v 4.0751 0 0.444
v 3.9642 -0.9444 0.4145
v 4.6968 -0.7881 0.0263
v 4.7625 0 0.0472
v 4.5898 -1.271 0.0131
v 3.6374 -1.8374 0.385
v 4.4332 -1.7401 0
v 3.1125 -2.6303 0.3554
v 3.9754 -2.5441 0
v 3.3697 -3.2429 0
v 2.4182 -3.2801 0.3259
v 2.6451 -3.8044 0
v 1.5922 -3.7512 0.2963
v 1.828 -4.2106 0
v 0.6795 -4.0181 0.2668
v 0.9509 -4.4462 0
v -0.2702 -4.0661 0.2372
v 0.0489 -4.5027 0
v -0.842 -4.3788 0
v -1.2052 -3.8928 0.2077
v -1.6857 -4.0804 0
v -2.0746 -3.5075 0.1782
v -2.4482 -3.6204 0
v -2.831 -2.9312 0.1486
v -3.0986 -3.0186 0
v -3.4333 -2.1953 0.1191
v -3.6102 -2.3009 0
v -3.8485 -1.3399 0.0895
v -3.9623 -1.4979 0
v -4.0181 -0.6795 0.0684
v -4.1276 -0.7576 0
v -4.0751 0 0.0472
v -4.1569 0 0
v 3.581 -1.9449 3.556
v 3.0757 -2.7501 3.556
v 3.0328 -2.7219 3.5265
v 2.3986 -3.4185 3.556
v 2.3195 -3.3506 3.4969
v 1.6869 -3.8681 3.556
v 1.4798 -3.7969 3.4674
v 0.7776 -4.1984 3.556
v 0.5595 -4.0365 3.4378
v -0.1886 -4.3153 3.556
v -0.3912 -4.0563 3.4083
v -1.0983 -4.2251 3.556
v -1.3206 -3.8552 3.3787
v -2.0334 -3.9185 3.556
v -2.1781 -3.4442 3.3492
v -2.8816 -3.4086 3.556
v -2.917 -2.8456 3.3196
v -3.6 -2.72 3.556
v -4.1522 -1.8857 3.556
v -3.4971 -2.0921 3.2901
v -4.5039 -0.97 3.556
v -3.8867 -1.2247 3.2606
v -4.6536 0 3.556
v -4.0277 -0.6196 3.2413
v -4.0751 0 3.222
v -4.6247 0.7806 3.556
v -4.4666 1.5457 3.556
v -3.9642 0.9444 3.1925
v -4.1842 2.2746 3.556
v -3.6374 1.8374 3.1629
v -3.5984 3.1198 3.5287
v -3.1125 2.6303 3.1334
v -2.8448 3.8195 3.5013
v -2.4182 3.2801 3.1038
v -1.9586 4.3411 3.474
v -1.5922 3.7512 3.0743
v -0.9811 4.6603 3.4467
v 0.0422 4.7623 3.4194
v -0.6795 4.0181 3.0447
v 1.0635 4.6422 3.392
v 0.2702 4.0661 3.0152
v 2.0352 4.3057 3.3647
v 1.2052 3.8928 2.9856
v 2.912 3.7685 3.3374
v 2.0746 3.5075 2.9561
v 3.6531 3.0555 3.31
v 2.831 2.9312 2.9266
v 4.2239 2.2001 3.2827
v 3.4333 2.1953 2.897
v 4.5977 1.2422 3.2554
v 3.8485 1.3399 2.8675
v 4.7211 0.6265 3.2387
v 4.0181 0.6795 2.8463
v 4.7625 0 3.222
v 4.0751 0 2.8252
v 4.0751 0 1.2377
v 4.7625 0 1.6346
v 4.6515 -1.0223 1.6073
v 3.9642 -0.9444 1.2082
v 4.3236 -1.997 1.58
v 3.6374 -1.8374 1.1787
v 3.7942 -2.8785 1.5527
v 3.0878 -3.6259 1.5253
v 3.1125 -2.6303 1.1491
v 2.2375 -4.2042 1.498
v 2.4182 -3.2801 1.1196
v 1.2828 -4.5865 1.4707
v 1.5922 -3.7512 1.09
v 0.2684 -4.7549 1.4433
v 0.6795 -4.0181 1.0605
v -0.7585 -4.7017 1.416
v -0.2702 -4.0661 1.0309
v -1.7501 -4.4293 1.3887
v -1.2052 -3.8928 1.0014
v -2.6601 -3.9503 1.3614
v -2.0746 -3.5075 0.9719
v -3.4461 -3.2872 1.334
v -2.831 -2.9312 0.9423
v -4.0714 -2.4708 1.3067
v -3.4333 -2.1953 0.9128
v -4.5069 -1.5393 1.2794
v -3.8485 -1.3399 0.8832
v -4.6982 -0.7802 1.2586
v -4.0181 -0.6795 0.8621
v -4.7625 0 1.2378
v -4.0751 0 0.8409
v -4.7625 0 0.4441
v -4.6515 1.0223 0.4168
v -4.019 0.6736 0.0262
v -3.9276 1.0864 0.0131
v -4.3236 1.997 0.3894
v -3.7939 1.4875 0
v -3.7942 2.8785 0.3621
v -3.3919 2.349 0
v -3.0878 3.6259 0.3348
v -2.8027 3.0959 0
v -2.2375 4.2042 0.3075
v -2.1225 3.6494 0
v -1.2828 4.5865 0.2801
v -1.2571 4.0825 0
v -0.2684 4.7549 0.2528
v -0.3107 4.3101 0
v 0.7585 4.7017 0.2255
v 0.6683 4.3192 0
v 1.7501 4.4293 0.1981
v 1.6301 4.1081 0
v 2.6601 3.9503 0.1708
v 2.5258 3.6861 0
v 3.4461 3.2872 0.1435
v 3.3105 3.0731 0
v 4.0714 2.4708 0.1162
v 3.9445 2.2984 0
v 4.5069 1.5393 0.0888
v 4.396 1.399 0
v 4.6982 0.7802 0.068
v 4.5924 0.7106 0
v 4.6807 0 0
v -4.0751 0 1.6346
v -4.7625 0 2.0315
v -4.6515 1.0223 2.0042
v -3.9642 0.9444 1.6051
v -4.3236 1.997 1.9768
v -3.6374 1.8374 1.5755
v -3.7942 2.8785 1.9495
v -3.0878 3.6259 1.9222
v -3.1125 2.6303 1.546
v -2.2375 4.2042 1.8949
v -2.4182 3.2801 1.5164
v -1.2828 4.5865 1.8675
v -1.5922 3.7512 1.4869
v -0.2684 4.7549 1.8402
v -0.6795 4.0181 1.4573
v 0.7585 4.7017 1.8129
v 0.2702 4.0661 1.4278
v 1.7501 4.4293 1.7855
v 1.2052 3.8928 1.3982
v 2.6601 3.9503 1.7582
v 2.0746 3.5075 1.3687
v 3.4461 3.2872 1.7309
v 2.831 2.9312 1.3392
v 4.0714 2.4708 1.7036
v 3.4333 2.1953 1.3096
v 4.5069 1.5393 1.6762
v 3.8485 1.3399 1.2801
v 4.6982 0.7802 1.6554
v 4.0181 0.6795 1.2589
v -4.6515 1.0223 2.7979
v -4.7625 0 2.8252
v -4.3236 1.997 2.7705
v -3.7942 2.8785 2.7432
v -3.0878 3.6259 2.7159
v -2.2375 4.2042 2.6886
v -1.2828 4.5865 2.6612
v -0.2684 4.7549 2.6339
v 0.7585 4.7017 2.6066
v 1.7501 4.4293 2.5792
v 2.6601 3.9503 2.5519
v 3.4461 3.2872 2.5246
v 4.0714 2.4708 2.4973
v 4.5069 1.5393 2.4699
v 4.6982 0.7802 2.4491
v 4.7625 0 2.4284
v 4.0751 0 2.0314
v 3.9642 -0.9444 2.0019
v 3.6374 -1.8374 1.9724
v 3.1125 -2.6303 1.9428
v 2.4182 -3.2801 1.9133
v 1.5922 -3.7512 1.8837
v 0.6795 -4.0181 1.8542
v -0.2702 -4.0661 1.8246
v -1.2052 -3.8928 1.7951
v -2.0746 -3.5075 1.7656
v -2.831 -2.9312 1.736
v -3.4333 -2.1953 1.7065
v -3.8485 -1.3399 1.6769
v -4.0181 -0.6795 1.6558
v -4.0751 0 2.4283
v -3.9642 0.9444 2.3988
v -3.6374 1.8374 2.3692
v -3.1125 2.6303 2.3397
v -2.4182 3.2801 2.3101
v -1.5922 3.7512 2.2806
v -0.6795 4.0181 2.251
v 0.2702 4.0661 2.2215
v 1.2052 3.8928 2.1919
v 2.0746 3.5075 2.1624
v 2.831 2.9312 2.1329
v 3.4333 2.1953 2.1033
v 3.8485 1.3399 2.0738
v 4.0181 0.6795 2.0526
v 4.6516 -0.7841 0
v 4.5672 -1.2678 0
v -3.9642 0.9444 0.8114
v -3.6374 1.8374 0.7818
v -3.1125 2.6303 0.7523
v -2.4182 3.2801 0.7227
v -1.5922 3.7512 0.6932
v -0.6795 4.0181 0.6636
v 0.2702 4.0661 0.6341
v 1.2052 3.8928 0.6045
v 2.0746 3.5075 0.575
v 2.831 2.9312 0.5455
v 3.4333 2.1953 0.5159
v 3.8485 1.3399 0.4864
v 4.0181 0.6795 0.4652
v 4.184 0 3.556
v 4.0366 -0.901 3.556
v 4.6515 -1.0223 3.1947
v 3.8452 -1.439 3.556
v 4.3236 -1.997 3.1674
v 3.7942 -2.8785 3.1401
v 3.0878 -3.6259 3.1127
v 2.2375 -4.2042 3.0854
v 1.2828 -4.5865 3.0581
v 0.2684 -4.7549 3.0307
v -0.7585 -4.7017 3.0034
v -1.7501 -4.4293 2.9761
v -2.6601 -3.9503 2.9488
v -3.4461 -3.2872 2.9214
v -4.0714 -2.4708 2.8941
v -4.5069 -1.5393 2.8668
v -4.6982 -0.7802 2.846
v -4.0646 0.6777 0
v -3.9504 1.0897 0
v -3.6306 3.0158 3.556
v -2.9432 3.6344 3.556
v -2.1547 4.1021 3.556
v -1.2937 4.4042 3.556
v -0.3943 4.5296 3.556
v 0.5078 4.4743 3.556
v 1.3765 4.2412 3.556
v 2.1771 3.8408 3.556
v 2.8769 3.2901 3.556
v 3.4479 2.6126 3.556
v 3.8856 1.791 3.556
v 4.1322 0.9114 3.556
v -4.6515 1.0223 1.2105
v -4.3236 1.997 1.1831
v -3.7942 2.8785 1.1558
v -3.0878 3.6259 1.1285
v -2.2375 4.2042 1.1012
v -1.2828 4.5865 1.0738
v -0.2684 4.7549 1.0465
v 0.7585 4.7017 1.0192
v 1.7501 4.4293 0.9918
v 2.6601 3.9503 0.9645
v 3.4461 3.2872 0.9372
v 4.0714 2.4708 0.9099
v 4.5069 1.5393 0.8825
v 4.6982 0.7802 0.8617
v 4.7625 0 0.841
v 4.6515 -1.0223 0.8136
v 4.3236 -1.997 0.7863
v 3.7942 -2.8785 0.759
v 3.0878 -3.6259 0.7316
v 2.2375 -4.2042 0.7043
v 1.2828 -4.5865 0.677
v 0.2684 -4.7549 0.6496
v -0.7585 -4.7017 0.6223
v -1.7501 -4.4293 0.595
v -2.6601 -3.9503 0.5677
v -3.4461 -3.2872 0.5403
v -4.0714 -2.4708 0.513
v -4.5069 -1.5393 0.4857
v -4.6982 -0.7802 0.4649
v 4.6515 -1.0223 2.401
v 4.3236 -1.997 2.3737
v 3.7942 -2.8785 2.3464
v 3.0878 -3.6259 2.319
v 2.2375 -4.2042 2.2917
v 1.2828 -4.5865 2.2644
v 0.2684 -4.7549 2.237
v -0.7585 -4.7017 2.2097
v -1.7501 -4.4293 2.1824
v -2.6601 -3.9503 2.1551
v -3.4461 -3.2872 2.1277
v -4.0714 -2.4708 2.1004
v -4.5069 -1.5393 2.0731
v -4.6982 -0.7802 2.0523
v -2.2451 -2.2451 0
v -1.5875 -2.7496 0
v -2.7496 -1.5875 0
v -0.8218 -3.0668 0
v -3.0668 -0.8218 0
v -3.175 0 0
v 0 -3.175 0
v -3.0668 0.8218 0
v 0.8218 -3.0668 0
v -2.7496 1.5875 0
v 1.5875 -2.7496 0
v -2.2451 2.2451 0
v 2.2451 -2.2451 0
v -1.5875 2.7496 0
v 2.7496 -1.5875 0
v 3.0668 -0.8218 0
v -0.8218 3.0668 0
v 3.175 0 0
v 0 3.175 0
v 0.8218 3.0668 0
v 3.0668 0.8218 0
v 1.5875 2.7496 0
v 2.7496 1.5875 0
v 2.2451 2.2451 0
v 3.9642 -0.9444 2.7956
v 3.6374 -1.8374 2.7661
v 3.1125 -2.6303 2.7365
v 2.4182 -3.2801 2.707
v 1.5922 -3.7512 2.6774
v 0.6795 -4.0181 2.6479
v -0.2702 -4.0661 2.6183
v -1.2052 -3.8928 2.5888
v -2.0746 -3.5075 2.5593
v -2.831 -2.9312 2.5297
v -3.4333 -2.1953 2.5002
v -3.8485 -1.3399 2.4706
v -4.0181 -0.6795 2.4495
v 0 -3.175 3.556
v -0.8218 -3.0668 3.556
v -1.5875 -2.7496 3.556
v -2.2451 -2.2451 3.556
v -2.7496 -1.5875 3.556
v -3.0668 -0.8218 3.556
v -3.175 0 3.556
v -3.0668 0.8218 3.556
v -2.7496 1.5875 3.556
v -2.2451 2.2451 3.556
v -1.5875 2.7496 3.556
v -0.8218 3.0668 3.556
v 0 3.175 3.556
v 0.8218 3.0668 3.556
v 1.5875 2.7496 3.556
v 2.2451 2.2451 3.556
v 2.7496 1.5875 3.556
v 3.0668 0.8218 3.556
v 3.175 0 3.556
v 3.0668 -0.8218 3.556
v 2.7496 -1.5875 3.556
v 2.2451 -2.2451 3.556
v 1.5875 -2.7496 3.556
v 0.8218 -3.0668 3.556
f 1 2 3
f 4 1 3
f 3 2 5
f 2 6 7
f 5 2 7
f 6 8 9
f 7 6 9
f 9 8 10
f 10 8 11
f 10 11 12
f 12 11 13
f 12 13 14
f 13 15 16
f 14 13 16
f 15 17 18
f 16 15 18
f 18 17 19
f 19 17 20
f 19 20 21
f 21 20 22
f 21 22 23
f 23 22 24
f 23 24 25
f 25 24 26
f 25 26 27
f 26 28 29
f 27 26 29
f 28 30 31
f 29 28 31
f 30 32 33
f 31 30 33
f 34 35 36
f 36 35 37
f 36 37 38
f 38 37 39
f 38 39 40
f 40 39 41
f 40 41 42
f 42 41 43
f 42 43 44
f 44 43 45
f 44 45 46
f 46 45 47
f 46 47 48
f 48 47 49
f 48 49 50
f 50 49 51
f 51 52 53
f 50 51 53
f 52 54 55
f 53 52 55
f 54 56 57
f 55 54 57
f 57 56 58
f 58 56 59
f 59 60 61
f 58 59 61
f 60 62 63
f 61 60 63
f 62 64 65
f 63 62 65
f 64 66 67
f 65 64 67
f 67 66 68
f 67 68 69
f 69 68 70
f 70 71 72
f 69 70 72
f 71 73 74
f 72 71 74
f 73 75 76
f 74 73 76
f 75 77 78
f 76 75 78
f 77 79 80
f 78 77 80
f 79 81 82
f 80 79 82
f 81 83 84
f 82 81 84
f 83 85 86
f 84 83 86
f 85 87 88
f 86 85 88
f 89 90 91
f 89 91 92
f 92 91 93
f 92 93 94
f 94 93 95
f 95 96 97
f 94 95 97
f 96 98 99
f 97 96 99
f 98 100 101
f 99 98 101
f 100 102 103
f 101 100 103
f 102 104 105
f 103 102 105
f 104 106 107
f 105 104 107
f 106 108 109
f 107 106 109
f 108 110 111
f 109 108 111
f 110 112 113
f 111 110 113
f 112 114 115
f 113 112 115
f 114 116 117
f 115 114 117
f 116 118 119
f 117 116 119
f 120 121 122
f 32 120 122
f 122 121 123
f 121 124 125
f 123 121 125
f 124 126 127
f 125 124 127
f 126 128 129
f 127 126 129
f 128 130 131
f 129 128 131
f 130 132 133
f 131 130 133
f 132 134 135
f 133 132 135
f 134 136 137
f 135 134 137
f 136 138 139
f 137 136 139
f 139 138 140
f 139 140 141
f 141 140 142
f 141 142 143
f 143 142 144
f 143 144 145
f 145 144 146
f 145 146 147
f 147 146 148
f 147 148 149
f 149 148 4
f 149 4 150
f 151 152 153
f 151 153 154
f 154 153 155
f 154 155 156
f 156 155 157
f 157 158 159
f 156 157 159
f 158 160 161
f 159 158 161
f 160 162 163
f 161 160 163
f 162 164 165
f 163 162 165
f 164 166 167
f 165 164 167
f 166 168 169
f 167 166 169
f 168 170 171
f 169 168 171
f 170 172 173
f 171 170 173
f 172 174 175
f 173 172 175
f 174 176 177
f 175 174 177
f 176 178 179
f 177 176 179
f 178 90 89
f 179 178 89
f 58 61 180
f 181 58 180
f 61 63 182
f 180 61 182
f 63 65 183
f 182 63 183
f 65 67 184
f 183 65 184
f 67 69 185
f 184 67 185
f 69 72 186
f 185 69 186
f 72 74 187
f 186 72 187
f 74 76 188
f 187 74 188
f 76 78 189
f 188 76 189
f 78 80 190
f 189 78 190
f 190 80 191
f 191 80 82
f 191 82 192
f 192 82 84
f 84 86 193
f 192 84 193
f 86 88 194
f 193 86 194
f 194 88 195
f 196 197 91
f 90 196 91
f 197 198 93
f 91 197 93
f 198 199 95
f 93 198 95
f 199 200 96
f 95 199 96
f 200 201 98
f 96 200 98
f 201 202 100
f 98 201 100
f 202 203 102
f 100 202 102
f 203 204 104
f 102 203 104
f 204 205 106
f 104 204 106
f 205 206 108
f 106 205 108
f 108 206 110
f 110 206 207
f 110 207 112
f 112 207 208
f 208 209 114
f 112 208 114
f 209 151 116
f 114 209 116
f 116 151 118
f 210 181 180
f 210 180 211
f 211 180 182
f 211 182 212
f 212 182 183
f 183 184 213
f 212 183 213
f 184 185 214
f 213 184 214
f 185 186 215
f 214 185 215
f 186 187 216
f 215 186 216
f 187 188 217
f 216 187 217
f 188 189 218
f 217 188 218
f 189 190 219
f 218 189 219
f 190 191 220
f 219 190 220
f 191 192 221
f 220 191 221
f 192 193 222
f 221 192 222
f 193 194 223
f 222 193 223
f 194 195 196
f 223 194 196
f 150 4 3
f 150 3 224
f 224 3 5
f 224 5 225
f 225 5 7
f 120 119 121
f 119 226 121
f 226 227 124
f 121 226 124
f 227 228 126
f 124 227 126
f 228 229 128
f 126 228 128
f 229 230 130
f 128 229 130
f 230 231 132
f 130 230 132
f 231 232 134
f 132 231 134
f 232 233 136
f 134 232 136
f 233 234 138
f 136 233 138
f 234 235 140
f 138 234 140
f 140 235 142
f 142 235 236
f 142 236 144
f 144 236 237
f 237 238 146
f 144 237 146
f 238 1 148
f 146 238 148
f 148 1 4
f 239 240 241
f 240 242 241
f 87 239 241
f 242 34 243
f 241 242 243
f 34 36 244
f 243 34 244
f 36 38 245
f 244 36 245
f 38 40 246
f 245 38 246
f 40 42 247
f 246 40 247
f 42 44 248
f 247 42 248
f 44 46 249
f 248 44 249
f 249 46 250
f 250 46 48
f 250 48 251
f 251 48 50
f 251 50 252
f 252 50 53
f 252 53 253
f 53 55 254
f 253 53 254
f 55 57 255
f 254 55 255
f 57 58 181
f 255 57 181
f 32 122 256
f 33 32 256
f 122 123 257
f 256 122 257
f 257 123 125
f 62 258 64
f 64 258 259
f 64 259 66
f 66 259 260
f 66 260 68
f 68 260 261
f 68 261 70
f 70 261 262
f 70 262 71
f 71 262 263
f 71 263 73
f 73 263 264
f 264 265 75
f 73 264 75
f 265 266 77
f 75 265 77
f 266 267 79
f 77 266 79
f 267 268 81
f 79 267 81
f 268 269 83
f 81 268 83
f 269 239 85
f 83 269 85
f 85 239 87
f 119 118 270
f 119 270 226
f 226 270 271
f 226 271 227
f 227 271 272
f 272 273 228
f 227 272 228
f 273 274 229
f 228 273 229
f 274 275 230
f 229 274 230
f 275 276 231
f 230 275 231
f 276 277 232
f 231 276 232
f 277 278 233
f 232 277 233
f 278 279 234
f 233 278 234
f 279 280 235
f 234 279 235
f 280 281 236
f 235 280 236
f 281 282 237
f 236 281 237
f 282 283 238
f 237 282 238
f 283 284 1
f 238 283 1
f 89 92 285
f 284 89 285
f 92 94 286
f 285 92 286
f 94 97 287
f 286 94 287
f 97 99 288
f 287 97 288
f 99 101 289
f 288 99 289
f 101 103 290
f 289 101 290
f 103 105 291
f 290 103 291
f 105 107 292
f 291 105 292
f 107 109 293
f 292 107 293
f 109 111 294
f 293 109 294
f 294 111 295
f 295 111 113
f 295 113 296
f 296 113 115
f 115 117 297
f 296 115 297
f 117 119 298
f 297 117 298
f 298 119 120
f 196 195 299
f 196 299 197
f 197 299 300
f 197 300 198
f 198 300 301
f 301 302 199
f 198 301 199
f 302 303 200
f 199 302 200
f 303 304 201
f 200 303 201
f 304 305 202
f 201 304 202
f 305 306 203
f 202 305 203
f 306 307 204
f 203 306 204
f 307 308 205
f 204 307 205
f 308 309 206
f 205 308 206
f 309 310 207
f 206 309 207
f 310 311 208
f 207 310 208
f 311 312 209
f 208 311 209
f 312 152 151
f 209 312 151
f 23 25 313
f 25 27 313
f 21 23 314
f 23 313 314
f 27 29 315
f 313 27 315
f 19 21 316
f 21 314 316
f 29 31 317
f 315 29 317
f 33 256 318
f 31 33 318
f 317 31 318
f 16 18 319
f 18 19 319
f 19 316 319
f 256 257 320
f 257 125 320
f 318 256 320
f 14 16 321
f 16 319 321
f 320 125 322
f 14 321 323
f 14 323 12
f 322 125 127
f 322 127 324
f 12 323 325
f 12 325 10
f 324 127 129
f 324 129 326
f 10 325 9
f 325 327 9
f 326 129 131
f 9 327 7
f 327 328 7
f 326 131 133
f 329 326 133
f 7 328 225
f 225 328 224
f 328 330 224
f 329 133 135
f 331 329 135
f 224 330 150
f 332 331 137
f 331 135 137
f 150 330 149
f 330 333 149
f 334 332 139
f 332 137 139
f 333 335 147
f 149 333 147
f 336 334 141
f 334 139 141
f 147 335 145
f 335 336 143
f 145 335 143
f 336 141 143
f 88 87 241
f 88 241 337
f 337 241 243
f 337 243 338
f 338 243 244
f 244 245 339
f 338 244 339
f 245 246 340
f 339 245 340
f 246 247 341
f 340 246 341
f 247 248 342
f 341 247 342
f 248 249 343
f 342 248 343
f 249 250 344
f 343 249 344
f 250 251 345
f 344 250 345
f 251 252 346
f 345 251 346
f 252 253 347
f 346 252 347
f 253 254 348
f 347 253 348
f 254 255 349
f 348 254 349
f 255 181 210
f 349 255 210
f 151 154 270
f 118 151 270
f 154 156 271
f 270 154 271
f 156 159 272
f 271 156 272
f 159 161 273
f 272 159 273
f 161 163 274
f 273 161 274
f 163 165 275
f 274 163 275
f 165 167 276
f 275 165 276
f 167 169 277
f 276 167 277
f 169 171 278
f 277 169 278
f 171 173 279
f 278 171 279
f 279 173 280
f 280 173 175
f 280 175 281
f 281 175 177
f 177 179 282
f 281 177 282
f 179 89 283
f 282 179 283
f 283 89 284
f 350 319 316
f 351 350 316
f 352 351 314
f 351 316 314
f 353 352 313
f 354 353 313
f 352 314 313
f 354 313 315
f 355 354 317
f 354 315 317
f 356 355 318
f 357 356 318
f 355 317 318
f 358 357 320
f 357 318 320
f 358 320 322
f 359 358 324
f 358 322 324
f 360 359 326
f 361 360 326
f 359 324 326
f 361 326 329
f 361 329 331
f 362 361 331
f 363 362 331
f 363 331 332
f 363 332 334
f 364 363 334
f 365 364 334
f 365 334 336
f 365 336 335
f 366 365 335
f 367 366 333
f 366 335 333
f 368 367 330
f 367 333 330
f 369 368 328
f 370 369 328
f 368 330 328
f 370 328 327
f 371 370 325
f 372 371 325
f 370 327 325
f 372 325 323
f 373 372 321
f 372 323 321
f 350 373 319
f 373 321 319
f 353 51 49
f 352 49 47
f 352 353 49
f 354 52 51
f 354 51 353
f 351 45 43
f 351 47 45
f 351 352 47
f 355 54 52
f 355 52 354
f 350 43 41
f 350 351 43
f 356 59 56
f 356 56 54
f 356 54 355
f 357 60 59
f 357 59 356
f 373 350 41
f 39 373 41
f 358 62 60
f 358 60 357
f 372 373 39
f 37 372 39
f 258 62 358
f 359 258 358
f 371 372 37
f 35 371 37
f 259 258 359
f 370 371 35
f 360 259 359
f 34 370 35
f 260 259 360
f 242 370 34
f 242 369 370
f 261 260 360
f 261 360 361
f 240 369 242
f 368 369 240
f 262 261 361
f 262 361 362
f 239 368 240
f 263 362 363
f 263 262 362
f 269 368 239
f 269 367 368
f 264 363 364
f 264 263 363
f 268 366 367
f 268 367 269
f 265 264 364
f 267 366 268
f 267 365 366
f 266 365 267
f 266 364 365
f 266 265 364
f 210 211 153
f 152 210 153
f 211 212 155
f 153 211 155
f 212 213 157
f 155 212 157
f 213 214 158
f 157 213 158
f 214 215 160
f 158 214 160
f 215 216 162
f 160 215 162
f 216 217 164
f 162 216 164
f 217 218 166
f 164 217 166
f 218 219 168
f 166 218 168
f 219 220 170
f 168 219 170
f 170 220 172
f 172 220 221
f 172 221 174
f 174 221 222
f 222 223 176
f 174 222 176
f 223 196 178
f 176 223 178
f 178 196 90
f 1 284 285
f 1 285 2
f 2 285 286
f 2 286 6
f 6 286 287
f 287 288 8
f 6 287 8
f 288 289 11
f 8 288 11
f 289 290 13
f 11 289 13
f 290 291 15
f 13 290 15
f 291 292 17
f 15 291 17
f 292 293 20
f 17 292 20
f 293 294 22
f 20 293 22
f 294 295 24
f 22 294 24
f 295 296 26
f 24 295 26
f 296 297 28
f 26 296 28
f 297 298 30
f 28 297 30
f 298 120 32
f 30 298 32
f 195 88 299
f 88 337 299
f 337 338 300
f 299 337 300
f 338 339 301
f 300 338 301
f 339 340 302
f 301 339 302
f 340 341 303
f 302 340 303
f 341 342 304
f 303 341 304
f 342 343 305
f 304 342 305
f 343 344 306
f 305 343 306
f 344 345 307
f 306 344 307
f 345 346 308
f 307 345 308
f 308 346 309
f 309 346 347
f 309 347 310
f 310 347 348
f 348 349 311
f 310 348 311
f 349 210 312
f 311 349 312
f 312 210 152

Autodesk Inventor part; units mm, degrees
ref_plane "YZ Plane" through (0, 0, 0) normal (1, 0, 0) x (0, 1, 0)
ref_plane "XZ Plane" through (0, 0, 0) normal (0, 1, 0) x (-1, 0, 0)
ref_plane "XY Plane" through (0, 0, 0) normal (0, 0, 1) x (1, 0, 0)
sketch "Sketch1" plane through (0, 0, 0) normal (0, 0, 1) x (1, 0, 0)
  circle A0 centre (0, 0) radius 4.7625
  dimension "d0" = 9.525
extrude "Extrusion1" add sketch "Sketch1" along normal blind 3.556
sketch "Sketch2" plane through (0, 0, 0) normal (0, 1, 0) x (-1, 0, 0)
  line L0 (4.7625, 4.4126) -> (4.0751, 4.0157)
  line L1 (4.0751, 4.0157) -> (4.7625, 3.6189)
  line L2 (4.7625, 3.6189) -> (4.7625, 4.4126)
  line L3 (4.7625, 0) -> (4.7625, 3.556) projected
  point P0 (0, 0)
  dimension "d3" = 60
  dimension "d4" = 0.7937
  dimension "d5" = 0.3969
coil "Coil1" sketch "Sketch2" operation cut axis through (0, 0, -10) along (0, 0, -1) pitch 0.7937 turns 7 hand right
sketch "Sketch3" plane through (0, 0, 3.556) normal (0, 0, 1) x (1, 0, 0)
  point P0 (0, 0)
  point P1 (0, 0)
hole "Hole1" at (0, 0, 3.556) direction (0, 0, -1) diameter 6.35 end through all
equation "\"d5\" = 0.5 * d4"
properties part number "Rod" material "Stainless Steel"
